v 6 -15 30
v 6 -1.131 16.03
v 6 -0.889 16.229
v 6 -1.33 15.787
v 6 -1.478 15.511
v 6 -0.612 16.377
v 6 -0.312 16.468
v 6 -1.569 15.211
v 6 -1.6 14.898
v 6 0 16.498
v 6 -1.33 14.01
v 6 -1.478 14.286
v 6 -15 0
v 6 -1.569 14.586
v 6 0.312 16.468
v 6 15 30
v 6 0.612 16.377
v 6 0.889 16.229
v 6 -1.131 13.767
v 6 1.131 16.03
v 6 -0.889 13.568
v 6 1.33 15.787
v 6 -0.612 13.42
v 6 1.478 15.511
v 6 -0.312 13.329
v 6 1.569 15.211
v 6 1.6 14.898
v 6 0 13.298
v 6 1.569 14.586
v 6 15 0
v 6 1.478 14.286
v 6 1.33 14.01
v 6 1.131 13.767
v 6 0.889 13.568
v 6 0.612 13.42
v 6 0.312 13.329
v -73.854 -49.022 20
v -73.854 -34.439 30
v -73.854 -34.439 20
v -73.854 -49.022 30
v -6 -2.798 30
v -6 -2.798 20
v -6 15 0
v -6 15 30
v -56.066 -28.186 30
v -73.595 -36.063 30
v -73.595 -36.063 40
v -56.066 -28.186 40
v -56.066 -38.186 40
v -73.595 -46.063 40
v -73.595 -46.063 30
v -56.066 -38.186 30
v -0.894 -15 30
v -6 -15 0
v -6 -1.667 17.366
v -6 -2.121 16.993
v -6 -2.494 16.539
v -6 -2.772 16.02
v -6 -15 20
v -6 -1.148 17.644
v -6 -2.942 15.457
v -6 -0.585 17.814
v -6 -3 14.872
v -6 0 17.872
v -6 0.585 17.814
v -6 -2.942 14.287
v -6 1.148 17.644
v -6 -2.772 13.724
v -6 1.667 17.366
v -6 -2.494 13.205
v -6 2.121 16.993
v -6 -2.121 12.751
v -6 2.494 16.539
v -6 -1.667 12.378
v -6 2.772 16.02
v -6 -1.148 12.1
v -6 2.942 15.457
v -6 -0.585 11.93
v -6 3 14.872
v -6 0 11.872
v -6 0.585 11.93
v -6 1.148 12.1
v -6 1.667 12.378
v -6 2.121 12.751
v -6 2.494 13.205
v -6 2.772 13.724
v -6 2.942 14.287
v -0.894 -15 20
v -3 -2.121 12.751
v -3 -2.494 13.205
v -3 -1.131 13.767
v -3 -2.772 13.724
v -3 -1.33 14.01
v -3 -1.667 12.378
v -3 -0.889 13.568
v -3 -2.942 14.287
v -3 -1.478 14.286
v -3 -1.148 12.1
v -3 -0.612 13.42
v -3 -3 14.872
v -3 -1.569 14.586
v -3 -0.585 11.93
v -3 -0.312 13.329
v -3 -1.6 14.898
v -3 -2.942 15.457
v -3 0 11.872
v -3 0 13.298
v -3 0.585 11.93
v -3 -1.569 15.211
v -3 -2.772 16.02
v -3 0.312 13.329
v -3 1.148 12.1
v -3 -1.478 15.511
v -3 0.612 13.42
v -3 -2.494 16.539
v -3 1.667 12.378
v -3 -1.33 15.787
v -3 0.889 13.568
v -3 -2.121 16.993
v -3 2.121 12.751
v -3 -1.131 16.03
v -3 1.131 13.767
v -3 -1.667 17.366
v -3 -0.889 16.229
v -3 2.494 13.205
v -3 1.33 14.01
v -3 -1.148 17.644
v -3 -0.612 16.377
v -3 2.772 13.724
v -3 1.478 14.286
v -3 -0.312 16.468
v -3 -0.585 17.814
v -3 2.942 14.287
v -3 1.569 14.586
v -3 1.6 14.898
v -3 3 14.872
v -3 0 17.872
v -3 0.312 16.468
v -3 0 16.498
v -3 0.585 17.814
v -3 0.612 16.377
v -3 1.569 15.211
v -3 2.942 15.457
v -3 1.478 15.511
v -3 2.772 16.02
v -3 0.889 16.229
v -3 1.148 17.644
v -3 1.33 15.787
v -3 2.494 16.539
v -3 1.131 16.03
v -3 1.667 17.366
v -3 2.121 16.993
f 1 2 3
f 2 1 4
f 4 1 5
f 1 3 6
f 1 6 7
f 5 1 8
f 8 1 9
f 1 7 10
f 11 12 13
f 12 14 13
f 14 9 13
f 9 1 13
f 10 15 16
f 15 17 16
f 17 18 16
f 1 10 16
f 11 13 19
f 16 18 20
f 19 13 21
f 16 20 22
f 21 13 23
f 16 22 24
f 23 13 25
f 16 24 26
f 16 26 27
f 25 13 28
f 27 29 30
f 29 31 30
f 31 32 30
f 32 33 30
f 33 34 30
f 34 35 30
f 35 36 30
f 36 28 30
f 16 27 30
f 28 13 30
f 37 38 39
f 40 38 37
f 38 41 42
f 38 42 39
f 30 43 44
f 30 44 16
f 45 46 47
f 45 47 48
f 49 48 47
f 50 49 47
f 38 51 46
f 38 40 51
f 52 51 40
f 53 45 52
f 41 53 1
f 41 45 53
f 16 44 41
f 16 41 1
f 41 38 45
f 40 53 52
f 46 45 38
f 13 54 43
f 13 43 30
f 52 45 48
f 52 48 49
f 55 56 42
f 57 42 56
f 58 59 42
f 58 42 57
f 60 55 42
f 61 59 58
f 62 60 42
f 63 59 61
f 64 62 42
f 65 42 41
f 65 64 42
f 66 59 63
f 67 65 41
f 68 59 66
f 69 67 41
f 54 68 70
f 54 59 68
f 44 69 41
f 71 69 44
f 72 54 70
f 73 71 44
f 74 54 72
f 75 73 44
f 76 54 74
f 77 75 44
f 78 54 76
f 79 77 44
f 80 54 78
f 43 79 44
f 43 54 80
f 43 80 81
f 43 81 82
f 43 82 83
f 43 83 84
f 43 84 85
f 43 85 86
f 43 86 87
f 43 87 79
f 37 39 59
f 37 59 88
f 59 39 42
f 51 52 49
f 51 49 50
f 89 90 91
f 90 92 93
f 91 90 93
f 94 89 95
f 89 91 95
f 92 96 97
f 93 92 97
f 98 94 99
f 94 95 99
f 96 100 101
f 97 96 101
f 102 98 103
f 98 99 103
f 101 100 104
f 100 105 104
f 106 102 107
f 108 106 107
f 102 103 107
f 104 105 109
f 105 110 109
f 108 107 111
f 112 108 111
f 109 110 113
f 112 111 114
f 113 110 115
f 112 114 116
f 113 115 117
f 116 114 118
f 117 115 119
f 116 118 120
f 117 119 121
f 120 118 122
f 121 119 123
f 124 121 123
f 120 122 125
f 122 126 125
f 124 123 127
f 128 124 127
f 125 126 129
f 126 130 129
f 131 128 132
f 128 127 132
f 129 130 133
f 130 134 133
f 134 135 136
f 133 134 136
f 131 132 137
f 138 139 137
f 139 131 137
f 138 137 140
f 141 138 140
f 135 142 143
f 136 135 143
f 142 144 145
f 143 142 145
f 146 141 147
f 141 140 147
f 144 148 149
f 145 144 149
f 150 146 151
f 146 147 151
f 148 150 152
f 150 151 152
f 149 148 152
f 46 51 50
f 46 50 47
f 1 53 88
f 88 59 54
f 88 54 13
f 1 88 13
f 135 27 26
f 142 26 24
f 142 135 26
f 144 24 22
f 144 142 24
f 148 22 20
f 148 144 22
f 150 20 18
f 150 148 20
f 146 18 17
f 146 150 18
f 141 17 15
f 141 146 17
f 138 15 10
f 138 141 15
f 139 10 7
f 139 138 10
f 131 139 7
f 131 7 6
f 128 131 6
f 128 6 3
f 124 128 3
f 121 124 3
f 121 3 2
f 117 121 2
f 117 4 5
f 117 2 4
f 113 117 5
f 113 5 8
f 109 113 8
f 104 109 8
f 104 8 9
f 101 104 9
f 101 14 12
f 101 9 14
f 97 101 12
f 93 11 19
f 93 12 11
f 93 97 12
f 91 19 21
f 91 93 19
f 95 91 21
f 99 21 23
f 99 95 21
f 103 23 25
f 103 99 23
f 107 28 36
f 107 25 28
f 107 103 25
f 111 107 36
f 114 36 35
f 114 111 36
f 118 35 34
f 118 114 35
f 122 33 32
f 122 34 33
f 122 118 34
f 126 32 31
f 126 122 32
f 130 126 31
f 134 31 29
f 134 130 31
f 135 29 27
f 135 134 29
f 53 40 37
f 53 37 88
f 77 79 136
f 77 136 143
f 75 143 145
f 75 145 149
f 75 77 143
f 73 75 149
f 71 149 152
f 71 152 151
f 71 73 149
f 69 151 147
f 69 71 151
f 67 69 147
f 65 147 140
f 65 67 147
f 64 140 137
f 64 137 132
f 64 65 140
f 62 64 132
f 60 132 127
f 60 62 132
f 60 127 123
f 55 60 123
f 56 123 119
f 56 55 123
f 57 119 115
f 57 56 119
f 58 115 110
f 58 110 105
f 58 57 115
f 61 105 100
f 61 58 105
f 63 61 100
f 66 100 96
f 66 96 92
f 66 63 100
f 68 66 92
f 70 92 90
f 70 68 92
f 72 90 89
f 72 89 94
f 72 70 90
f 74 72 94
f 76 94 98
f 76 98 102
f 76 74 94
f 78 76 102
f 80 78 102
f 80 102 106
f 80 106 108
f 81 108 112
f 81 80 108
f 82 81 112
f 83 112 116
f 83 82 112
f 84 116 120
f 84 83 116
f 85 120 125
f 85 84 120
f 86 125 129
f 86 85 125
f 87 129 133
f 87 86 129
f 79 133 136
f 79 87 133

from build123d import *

# Parameters (mm, degrees)
SKETCH_W        = 12
SKETCH_H        = 30
PAD_DEPTH       = 30
PAD001_DEPTH    = 10
SKETCH004_R     = 3
POCKET001_DEPTH = 3
SKETCH005_R     = 1.6
POCKET_DEPTH    = 9.001
PAD002_DEPTH    = 10


with BuildPart() as part:
    # Sketch → Pad (new body)
    with BuildSketch(Plane.XY):
        Rectangle(SKETCH_W, SKETCH_H)
    extrude(amount=PAD_DEPTH)

    # Sketch001 → Pad001 (join)
    with BuildSketch(Plane.XY.offset(30)):
        Polygon((0, 0), (-73.854295, -34.438823), (-73.854295, -49.021726), (0, -14.582903), align=None)
    extrude(amount=-PAD001_DEPTH)

    # Sketch004 → Pocket001 (cut)
    with BuildSketch(Plane.YZ.offset(-6)):
        with Locations((0, 14.871989)):
            Circle(SKETCH004_R)
    extrude(amount=POCKET001_DEPTH, mode=Mode.SUBTRACT)

    # Sketch005 → Pocket (cut, through all)
    with BuildSketch(Plane.YZ.offset(-3)):
        with Locations((0, 14.898449)):
            Circle(SKETCH005_R)
    extrude(amount=POCKET_DEPTH, mode=Mode.SUBTRACT)

    # Sketch006 → Pad002 (join)
    with BuildSketch(Plane.XY.offset(30)):
        Polygon((-73.59462, -36.062692), (-56.065701, -28.186142), (-56.065701, -38.186142), (-73.59462, -46.062692), align=None)
    extrude(amount=PAD002_DEPTH)


solid = part.part
